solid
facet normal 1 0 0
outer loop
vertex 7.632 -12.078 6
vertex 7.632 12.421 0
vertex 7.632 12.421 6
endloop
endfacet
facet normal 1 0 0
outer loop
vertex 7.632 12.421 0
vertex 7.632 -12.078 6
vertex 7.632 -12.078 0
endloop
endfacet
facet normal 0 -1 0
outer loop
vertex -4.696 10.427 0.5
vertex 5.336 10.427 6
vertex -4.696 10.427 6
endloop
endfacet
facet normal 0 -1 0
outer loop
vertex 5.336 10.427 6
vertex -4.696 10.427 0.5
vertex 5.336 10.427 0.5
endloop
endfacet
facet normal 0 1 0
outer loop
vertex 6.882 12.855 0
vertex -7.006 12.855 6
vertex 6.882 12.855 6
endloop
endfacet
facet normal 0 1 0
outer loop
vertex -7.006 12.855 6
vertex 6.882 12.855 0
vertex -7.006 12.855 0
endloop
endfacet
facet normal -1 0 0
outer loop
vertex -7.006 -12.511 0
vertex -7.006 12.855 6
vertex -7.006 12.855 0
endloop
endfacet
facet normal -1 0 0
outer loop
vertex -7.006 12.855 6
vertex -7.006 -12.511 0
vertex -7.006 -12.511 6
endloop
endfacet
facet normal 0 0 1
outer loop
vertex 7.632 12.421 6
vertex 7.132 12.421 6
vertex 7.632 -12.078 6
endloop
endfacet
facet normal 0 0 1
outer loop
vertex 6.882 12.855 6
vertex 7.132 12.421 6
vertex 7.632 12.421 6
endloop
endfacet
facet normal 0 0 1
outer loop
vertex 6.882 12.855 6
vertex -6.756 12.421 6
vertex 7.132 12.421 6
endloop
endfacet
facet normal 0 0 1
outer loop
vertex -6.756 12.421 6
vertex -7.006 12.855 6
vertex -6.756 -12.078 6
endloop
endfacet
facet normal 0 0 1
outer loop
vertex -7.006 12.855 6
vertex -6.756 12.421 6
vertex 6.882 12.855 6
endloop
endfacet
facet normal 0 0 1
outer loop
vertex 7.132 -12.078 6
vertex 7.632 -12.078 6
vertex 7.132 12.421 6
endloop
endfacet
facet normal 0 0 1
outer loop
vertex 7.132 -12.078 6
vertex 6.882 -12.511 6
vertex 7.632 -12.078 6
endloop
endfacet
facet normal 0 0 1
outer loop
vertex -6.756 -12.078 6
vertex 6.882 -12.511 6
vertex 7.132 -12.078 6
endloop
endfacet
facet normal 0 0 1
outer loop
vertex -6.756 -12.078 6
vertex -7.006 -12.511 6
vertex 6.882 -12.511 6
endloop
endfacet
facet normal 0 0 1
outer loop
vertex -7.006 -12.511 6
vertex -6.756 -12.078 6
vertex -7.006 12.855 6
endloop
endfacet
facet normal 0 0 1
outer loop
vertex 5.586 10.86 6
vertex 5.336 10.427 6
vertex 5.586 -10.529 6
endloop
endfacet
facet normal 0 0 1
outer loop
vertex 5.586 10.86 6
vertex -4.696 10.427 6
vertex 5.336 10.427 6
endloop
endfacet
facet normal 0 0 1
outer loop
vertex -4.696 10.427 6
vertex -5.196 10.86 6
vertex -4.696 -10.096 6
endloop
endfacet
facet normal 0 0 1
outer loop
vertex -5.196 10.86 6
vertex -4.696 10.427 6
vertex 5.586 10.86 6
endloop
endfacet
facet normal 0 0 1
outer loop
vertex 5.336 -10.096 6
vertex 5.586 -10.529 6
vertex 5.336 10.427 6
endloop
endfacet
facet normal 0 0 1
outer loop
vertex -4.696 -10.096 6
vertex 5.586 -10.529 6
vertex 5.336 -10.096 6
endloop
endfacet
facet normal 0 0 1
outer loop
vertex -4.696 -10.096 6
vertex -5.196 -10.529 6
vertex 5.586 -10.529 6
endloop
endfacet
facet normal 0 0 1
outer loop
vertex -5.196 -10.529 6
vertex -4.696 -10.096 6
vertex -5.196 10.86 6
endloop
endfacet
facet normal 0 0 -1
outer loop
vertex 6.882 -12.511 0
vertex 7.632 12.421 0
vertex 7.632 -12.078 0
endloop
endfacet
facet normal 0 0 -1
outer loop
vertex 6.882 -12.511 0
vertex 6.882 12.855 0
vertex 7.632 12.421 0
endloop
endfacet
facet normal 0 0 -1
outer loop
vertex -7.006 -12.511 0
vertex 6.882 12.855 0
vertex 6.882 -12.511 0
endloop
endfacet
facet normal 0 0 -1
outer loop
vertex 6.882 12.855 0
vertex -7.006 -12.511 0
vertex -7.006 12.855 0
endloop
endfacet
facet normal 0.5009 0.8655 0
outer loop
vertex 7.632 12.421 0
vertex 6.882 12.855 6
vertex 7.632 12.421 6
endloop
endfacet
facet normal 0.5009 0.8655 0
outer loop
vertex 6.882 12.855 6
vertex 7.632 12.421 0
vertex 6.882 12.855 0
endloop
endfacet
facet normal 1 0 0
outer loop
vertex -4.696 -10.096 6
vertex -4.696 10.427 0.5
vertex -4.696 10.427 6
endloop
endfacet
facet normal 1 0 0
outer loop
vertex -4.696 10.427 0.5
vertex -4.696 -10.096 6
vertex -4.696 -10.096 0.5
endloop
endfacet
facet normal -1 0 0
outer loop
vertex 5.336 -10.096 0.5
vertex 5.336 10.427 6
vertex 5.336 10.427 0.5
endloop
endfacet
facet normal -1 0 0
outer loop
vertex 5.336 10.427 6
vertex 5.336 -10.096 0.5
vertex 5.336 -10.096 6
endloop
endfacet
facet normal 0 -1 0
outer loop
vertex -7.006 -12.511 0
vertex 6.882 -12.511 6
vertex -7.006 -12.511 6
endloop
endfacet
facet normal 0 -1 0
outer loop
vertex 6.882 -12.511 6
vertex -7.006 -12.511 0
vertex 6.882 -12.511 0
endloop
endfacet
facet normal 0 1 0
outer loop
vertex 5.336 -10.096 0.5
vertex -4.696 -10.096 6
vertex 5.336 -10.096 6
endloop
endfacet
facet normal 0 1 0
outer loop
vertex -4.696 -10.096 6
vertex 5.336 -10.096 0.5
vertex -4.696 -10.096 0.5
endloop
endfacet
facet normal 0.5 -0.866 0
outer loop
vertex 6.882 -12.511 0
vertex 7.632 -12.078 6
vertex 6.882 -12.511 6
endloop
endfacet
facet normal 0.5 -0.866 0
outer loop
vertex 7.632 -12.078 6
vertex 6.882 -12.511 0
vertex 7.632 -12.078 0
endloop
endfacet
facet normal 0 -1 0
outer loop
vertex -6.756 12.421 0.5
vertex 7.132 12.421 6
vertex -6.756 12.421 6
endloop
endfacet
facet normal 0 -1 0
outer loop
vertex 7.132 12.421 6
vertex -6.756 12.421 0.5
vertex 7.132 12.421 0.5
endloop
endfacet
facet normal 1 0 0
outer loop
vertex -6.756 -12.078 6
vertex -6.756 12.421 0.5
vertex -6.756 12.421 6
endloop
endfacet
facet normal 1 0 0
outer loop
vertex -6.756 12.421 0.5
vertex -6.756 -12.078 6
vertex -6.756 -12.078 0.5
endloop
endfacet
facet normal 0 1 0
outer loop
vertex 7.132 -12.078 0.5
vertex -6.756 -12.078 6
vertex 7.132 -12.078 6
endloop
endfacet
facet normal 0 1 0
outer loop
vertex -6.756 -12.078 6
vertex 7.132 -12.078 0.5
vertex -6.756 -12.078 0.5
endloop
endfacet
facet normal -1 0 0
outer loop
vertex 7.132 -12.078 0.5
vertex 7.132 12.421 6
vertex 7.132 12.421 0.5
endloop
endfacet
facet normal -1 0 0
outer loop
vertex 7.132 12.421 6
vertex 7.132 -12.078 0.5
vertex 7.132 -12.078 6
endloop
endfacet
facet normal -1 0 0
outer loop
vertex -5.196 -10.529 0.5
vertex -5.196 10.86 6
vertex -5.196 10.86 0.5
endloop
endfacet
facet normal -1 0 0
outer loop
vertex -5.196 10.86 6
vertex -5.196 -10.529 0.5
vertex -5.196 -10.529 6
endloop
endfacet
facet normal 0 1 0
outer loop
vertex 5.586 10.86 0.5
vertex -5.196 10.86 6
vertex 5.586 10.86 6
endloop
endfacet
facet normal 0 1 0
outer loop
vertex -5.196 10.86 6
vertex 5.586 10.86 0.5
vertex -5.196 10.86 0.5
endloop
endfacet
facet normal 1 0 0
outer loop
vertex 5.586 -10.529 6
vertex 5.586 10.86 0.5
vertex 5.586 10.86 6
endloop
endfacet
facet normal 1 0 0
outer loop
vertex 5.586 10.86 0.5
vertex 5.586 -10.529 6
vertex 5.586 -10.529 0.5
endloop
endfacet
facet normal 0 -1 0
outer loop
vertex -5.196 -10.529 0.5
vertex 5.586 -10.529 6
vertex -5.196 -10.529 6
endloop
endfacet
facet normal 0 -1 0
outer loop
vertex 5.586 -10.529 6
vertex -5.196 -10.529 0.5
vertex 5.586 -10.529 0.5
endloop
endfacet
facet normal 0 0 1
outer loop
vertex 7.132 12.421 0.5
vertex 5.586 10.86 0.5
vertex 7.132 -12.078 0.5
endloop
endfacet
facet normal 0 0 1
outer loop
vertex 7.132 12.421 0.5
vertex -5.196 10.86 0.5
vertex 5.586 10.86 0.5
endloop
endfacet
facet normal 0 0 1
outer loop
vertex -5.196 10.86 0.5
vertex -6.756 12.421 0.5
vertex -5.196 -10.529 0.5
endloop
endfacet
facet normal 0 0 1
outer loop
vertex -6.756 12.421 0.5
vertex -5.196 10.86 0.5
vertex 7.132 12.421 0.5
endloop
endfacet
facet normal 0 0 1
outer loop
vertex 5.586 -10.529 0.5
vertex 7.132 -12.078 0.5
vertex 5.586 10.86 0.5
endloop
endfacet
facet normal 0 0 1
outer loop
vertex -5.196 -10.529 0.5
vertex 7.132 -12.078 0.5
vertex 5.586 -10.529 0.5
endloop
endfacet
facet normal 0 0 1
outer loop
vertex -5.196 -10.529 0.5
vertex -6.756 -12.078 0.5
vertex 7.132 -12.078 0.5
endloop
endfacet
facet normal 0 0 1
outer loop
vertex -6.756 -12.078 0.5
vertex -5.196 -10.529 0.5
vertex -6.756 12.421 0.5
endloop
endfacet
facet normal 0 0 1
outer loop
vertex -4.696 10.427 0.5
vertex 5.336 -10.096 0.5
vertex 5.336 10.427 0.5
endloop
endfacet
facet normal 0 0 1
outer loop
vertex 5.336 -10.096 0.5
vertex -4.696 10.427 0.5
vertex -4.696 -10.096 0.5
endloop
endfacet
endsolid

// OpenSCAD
/*
use this webiste to get cool icons! 

http://fortawesome.github.io/Font-Awesome/cheatsheet/

and follow this tutorial for how to install fontawesome 

*/
type	=	"text";
text	=	"";
xdf		=	"/Users/benjamin/Desktop/kokapelli cookie cutter.dxf";
resolution = 2; //this is fun to set low if you want to make low poly cookie cutters!
font = "fontawesome";
wall_thickness = 1;
wall_height = 5;
icon_height = 3;
font_size = 20;
top_thickness = 1;






$fn= resolution;
module cutter(){
	linear_extrude(height = wall_thickness) {
		if (type=="text"){
			text(text = text, font = font, size = font_size, valign = "center", halign = "center");
		} else {
			import(xdf);
		}
	}
}

module cutting_walls(){
	minkowski(){
		 cutter();
		 cylinder(r=wall_thickness/2,h=wall_height);
	}
}

difference(){
	cutting_walls();
	translate([0,0,-10]) cutter(wall_thickness = 20);
}

intersection(){
	cube([100,100,top_thickness], center=true);
	hull(){
		cutter();
	}
}
